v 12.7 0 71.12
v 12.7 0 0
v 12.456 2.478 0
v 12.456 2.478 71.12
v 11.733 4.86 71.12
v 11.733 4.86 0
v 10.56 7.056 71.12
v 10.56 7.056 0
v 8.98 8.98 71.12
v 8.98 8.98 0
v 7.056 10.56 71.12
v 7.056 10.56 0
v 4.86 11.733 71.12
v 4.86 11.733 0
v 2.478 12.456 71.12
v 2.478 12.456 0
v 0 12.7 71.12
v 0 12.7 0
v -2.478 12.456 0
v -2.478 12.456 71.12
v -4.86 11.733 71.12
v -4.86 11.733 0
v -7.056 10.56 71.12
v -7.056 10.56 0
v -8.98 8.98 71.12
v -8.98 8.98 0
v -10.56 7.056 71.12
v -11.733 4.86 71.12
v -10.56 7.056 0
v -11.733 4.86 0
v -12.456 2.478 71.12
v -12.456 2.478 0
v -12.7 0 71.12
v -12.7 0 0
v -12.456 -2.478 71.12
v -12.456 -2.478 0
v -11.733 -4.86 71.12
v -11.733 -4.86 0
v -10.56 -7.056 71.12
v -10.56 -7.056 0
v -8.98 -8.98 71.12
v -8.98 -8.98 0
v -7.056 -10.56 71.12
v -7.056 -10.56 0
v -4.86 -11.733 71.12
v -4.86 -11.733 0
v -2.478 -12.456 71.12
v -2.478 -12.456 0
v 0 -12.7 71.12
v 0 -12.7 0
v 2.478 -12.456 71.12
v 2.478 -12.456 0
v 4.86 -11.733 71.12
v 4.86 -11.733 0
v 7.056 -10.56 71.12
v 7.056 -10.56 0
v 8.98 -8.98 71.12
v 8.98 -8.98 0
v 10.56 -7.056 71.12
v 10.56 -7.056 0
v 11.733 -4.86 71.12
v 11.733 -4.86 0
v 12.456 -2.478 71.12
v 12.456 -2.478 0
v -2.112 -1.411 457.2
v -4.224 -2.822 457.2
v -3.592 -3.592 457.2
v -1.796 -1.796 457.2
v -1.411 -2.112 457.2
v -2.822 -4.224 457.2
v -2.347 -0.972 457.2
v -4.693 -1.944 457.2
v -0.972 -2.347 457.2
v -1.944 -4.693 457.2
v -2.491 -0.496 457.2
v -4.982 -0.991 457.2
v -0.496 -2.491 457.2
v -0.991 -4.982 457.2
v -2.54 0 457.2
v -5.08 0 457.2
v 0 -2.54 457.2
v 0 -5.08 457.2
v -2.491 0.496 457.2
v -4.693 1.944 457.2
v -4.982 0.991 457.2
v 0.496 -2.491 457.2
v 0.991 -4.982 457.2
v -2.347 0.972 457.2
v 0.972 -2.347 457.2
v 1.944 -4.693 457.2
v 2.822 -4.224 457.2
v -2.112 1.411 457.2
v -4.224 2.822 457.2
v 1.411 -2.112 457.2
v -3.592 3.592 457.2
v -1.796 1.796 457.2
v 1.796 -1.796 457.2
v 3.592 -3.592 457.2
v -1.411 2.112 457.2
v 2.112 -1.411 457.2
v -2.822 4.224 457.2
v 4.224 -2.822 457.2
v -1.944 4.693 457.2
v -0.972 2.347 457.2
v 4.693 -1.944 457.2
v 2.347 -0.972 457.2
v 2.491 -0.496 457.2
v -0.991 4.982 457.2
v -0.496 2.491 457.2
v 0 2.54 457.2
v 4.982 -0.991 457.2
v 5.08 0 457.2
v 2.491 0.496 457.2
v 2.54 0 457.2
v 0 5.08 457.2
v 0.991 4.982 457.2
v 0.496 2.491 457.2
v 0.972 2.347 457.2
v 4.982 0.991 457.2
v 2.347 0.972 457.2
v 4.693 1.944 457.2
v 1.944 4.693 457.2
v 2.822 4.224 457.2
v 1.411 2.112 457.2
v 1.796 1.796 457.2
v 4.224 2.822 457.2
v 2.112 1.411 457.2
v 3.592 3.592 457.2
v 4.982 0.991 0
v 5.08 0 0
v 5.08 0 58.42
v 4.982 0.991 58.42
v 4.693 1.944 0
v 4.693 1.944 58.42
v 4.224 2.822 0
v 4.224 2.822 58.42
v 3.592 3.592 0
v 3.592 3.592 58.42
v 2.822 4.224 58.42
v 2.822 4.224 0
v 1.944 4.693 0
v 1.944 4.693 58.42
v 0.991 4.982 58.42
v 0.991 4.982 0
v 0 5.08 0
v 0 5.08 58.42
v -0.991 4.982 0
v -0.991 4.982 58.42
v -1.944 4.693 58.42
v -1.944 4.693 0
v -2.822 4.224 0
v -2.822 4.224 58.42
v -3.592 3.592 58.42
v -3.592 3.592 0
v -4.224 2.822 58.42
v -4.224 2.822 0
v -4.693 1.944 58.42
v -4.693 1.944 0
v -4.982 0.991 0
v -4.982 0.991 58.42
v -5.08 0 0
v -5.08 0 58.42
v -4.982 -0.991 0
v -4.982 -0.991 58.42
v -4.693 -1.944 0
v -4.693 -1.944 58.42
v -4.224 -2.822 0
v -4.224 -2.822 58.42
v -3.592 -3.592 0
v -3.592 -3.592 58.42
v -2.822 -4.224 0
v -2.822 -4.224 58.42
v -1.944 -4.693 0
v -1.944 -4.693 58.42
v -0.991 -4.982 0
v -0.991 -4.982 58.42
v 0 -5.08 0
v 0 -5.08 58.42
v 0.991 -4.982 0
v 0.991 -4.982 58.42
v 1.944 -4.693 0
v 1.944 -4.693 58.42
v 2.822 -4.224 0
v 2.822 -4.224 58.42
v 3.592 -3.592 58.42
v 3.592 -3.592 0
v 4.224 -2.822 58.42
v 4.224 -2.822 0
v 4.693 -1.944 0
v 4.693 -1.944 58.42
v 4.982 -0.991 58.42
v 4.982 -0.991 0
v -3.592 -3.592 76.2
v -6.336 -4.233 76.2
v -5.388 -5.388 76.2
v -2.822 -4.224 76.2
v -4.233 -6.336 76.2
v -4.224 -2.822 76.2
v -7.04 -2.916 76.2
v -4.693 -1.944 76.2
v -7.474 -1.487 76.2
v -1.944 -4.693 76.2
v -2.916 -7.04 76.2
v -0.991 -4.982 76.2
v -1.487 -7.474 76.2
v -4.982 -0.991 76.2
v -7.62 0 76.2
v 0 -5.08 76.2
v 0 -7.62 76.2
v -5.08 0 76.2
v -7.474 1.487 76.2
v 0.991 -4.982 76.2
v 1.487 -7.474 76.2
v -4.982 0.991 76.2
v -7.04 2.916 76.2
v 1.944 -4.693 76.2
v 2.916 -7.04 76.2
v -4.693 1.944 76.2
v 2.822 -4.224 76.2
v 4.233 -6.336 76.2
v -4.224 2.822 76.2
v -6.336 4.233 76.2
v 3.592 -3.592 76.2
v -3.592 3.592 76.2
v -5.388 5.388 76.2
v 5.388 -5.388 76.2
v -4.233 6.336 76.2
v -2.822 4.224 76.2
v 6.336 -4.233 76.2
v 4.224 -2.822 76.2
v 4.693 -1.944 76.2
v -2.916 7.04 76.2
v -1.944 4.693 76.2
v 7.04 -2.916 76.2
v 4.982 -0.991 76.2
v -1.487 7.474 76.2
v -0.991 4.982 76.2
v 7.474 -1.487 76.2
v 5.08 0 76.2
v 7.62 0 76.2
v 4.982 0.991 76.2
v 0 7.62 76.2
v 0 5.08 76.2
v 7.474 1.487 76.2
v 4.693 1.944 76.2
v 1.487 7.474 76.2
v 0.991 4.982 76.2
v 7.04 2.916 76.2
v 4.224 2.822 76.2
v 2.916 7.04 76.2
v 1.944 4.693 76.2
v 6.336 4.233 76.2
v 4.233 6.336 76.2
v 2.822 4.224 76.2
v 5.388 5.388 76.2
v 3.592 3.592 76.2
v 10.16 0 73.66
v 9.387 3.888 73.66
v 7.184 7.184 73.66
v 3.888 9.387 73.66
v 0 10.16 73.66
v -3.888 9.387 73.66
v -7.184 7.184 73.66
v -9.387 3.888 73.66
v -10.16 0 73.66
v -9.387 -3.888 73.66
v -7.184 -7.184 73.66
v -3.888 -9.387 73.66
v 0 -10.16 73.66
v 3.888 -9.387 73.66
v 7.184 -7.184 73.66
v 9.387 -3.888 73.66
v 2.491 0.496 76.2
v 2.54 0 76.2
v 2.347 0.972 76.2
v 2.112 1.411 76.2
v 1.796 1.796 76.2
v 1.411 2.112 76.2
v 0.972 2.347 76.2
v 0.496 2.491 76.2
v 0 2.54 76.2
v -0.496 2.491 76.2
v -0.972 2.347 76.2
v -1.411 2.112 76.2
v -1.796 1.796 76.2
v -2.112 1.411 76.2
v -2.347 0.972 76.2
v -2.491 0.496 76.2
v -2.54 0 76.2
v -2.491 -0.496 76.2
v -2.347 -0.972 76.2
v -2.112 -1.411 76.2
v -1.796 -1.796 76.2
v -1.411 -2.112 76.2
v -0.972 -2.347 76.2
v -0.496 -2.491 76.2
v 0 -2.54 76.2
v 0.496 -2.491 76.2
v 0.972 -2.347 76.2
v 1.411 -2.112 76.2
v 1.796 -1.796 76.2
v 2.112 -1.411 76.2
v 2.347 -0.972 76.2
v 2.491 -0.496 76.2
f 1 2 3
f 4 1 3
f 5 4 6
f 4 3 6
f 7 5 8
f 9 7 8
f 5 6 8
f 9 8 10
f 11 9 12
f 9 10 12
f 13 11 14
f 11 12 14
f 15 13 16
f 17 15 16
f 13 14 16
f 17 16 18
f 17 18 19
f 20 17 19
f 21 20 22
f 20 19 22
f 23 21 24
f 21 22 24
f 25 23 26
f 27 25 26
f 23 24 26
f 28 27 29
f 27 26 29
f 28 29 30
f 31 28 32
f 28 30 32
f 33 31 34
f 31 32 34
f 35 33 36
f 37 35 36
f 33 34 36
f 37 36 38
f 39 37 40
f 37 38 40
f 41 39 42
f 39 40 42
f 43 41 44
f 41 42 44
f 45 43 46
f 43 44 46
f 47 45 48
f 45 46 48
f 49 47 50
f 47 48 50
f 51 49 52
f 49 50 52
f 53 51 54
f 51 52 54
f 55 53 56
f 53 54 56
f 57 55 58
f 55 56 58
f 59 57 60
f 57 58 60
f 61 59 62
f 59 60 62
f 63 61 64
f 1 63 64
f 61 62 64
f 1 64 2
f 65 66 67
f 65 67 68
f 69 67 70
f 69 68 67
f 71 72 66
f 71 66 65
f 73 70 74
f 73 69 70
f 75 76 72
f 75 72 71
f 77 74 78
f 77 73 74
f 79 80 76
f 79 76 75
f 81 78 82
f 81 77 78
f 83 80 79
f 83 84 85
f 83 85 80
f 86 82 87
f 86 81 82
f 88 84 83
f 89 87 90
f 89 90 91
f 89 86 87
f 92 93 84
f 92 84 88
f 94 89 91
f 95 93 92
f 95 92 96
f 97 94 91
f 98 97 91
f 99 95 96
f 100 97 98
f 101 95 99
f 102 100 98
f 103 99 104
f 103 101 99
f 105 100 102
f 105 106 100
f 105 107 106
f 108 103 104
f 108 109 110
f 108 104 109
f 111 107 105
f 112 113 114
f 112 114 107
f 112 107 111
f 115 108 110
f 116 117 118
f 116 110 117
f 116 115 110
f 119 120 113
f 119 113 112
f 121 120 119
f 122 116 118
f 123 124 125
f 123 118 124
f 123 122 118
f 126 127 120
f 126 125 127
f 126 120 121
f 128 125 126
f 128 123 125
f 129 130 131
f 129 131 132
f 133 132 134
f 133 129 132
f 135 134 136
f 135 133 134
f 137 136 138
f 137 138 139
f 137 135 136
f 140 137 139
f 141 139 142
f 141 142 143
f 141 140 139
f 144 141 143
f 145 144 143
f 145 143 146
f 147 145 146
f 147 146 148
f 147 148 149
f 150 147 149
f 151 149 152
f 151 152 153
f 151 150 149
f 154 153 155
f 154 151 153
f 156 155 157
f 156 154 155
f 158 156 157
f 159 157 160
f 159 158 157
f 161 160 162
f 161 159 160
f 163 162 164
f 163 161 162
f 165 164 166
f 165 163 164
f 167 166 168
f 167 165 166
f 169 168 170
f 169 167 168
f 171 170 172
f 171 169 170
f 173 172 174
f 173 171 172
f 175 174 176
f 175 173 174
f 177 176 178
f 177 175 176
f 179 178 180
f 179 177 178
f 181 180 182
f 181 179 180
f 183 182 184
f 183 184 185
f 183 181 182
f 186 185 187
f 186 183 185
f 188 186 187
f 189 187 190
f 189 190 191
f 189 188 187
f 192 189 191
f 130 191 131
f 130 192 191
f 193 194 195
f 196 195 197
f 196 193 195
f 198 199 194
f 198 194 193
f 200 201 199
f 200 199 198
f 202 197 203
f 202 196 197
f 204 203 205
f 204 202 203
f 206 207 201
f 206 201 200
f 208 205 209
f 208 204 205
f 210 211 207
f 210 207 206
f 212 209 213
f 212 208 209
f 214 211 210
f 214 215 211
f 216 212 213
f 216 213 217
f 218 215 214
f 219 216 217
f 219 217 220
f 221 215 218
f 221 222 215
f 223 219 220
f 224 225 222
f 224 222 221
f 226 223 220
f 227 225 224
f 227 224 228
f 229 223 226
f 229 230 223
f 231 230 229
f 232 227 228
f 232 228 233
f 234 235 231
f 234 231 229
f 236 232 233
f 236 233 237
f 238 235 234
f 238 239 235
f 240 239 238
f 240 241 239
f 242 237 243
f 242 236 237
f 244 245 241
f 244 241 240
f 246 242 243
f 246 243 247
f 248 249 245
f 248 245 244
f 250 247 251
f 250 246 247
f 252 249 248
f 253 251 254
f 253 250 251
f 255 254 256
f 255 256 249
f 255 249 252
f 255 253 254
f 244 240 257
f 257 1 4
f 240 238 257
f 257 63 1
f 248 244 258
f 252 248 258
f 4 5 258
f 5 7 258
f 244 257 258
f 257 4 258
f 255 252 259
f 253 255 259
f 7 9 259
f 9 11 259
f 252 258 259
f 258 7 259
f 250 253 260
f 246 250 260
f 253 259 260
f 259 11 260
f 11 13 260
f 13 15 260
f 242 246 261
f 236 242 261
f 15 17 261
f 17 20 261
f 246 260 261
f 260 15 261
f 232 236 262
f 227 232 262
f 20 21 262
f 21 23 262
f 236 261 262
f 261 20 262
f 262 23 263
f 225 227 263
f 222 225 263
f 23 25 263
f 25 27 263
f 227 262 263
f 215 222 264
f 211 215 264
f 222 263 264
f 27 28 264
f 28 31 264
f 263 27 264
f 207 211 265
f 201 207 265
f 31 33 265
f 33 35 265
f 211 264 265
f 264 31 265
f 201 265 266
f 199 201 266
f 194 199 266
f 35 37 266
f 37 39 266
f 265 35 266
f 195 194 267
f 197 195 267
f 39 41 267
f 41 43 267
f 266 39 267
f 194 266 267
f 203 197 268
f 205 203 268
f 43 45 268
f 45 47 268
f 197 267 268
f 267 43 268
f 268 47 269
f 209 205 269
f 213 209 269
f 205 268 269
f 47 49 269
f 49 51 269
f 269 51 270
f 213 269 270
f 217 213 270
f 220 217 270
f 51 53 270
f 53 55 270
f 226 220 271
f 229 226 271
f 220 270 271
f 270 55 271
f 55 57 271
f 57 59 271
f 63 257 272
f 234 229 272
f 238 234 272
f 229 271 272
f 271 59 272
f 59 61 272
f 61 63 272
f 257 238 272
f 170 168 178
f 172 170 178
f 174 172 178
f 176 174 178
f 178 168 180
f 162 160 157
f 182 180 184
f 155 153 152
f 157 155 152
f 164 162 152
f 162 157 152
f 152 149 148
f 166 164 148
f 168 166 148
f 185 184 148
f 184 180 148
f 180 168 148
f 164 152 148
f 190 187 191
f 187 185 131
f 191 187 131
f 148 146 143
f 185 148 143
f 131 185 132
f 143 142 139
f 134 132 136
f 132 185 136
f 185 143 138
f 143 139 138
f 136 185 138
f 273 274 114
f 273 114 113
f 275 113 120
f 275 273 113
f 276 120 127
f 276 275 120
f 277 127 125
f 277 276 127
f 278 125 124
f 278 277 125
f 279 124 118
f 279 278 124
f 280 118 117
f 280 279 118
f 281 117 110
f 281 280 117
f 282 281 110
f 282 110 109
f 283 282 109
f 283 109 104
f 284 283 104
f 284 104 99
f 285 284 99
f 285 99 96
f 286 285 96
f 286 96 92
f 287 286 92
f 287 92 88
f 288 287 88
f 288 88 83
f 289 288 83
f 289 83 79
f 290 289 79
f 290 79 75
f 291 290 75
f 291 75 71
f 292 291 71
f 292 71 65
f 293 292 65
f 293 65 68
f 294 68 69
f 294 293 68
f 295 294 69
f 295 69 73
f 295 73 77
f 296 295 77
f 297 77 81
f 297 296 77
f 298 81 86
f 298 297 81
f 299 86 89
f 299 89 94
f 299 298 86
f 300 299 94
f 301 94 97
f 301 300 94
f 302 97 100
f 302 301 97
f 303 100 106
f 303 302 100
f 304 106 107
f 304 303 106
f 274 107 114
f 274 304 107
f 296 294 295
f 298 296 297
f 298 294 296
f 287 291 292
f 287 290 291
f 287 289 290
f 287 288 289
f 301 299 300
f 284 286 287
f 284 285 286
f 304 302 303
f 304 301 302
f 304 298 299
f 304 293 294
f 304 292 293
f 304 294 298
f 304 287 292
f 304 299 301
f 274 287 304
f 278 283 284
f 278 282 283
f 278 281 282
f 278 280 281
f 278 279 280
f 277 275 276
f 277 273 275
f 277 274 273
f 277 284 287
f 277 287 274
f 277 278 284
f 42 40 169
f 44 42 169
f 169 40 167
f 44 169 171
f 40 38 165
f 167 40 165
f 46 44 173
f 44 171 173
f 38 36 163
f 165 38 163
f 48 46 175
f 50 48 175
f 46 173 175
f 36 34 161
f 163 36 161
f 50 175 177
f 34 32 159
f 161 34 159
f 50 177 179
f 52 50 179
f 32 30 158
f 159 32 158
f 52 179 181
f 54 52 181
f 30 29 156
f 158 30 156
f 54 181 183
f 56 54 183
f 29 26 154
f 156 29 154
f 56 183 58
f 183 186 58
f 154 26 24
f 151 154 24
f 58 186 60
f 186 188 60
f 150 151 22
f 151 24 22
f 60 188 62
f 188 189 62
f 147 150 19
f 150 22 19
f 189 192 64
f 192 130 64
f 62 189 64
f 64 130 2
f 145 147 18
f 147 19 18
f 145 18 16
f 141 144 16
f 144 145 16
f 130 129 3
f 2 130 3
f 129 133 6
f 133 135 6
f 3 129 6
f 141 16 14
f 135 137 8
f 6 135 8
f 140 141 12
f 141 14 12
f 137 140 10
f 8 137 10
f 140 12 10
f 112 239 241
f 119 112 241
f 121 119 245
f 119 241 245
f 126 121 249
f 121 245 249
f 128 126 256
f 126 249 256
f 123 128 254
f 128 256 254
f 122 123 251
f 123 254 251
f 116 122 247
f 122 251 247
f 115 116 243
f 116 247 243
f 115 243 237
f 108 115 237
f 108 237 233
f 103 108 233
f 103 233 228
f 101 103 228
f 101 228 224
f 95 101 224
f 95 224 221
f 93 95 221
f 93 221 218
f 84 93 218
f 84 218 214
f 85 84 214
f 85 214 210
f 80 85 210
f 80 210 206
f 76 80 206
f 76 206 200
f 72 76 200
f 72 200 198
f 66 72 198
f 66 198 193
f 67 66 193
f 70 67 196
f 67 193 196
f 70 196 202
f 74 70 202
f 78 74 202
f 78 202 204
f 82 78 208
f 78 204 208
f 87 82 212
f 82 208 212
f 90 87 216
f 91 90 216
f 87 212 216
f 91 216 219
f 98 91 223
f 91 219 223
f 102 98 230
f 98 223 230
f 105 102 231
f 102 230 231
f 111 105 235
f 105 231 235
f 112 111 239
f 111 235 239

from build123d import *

# Parameters (mm, degrees)
F0_R     = 12.7
F0_R_2   = 5.08
F0_R_3   = 2.54
F1_DEPTH = 76.2
F2_DEPTH = 58.42
F3_START = 71.628
F3_DEPTH = 385.572
F4_SIZE  = 5.08


with BuildPart() as f1:
    # F0 (on Top) → F1 (new body)
    with BuildSketch(Plane.XY):
        Circle(F0_R)
        Circle(F0_R_2, mode=Mode.SUBTRACT)
        Circle(F0_R_2)
        Circle(F0_R_3, mode=Mode.SUBTRACT)
        Circle(F0_R_3)
    extrude(amount=F1_DEPTH)

    # F0 (on Top) → F2 (cut)
    with BuildSketch(Plane.XY):
        Circle(F0_R_2)
        Circle(F0_R_3, mode=Mode.SUBTRACT)
        Circle(F0_R_3)
    extrude(amount=F2_DEPTH, mode=Mode.SUBTRACT)

    # F0 (on Top) → F3 (join)
    with BuildSketch(Plane.XY.offset(F3_START)):
        Circle(F0_R_2)
        Circle(F0_R_3, mode=Mode.SUBTRACT)
    extrude(amount=F3_DEPTH)

    # F4
    f4_edges = [f1.edges().sort_by_distance(p)[0] for p in [
        (-12.7, 0, 76.2),
    ]]
    chamfer(f4_edges, length=F4_SIZE)


solid = f1.part
